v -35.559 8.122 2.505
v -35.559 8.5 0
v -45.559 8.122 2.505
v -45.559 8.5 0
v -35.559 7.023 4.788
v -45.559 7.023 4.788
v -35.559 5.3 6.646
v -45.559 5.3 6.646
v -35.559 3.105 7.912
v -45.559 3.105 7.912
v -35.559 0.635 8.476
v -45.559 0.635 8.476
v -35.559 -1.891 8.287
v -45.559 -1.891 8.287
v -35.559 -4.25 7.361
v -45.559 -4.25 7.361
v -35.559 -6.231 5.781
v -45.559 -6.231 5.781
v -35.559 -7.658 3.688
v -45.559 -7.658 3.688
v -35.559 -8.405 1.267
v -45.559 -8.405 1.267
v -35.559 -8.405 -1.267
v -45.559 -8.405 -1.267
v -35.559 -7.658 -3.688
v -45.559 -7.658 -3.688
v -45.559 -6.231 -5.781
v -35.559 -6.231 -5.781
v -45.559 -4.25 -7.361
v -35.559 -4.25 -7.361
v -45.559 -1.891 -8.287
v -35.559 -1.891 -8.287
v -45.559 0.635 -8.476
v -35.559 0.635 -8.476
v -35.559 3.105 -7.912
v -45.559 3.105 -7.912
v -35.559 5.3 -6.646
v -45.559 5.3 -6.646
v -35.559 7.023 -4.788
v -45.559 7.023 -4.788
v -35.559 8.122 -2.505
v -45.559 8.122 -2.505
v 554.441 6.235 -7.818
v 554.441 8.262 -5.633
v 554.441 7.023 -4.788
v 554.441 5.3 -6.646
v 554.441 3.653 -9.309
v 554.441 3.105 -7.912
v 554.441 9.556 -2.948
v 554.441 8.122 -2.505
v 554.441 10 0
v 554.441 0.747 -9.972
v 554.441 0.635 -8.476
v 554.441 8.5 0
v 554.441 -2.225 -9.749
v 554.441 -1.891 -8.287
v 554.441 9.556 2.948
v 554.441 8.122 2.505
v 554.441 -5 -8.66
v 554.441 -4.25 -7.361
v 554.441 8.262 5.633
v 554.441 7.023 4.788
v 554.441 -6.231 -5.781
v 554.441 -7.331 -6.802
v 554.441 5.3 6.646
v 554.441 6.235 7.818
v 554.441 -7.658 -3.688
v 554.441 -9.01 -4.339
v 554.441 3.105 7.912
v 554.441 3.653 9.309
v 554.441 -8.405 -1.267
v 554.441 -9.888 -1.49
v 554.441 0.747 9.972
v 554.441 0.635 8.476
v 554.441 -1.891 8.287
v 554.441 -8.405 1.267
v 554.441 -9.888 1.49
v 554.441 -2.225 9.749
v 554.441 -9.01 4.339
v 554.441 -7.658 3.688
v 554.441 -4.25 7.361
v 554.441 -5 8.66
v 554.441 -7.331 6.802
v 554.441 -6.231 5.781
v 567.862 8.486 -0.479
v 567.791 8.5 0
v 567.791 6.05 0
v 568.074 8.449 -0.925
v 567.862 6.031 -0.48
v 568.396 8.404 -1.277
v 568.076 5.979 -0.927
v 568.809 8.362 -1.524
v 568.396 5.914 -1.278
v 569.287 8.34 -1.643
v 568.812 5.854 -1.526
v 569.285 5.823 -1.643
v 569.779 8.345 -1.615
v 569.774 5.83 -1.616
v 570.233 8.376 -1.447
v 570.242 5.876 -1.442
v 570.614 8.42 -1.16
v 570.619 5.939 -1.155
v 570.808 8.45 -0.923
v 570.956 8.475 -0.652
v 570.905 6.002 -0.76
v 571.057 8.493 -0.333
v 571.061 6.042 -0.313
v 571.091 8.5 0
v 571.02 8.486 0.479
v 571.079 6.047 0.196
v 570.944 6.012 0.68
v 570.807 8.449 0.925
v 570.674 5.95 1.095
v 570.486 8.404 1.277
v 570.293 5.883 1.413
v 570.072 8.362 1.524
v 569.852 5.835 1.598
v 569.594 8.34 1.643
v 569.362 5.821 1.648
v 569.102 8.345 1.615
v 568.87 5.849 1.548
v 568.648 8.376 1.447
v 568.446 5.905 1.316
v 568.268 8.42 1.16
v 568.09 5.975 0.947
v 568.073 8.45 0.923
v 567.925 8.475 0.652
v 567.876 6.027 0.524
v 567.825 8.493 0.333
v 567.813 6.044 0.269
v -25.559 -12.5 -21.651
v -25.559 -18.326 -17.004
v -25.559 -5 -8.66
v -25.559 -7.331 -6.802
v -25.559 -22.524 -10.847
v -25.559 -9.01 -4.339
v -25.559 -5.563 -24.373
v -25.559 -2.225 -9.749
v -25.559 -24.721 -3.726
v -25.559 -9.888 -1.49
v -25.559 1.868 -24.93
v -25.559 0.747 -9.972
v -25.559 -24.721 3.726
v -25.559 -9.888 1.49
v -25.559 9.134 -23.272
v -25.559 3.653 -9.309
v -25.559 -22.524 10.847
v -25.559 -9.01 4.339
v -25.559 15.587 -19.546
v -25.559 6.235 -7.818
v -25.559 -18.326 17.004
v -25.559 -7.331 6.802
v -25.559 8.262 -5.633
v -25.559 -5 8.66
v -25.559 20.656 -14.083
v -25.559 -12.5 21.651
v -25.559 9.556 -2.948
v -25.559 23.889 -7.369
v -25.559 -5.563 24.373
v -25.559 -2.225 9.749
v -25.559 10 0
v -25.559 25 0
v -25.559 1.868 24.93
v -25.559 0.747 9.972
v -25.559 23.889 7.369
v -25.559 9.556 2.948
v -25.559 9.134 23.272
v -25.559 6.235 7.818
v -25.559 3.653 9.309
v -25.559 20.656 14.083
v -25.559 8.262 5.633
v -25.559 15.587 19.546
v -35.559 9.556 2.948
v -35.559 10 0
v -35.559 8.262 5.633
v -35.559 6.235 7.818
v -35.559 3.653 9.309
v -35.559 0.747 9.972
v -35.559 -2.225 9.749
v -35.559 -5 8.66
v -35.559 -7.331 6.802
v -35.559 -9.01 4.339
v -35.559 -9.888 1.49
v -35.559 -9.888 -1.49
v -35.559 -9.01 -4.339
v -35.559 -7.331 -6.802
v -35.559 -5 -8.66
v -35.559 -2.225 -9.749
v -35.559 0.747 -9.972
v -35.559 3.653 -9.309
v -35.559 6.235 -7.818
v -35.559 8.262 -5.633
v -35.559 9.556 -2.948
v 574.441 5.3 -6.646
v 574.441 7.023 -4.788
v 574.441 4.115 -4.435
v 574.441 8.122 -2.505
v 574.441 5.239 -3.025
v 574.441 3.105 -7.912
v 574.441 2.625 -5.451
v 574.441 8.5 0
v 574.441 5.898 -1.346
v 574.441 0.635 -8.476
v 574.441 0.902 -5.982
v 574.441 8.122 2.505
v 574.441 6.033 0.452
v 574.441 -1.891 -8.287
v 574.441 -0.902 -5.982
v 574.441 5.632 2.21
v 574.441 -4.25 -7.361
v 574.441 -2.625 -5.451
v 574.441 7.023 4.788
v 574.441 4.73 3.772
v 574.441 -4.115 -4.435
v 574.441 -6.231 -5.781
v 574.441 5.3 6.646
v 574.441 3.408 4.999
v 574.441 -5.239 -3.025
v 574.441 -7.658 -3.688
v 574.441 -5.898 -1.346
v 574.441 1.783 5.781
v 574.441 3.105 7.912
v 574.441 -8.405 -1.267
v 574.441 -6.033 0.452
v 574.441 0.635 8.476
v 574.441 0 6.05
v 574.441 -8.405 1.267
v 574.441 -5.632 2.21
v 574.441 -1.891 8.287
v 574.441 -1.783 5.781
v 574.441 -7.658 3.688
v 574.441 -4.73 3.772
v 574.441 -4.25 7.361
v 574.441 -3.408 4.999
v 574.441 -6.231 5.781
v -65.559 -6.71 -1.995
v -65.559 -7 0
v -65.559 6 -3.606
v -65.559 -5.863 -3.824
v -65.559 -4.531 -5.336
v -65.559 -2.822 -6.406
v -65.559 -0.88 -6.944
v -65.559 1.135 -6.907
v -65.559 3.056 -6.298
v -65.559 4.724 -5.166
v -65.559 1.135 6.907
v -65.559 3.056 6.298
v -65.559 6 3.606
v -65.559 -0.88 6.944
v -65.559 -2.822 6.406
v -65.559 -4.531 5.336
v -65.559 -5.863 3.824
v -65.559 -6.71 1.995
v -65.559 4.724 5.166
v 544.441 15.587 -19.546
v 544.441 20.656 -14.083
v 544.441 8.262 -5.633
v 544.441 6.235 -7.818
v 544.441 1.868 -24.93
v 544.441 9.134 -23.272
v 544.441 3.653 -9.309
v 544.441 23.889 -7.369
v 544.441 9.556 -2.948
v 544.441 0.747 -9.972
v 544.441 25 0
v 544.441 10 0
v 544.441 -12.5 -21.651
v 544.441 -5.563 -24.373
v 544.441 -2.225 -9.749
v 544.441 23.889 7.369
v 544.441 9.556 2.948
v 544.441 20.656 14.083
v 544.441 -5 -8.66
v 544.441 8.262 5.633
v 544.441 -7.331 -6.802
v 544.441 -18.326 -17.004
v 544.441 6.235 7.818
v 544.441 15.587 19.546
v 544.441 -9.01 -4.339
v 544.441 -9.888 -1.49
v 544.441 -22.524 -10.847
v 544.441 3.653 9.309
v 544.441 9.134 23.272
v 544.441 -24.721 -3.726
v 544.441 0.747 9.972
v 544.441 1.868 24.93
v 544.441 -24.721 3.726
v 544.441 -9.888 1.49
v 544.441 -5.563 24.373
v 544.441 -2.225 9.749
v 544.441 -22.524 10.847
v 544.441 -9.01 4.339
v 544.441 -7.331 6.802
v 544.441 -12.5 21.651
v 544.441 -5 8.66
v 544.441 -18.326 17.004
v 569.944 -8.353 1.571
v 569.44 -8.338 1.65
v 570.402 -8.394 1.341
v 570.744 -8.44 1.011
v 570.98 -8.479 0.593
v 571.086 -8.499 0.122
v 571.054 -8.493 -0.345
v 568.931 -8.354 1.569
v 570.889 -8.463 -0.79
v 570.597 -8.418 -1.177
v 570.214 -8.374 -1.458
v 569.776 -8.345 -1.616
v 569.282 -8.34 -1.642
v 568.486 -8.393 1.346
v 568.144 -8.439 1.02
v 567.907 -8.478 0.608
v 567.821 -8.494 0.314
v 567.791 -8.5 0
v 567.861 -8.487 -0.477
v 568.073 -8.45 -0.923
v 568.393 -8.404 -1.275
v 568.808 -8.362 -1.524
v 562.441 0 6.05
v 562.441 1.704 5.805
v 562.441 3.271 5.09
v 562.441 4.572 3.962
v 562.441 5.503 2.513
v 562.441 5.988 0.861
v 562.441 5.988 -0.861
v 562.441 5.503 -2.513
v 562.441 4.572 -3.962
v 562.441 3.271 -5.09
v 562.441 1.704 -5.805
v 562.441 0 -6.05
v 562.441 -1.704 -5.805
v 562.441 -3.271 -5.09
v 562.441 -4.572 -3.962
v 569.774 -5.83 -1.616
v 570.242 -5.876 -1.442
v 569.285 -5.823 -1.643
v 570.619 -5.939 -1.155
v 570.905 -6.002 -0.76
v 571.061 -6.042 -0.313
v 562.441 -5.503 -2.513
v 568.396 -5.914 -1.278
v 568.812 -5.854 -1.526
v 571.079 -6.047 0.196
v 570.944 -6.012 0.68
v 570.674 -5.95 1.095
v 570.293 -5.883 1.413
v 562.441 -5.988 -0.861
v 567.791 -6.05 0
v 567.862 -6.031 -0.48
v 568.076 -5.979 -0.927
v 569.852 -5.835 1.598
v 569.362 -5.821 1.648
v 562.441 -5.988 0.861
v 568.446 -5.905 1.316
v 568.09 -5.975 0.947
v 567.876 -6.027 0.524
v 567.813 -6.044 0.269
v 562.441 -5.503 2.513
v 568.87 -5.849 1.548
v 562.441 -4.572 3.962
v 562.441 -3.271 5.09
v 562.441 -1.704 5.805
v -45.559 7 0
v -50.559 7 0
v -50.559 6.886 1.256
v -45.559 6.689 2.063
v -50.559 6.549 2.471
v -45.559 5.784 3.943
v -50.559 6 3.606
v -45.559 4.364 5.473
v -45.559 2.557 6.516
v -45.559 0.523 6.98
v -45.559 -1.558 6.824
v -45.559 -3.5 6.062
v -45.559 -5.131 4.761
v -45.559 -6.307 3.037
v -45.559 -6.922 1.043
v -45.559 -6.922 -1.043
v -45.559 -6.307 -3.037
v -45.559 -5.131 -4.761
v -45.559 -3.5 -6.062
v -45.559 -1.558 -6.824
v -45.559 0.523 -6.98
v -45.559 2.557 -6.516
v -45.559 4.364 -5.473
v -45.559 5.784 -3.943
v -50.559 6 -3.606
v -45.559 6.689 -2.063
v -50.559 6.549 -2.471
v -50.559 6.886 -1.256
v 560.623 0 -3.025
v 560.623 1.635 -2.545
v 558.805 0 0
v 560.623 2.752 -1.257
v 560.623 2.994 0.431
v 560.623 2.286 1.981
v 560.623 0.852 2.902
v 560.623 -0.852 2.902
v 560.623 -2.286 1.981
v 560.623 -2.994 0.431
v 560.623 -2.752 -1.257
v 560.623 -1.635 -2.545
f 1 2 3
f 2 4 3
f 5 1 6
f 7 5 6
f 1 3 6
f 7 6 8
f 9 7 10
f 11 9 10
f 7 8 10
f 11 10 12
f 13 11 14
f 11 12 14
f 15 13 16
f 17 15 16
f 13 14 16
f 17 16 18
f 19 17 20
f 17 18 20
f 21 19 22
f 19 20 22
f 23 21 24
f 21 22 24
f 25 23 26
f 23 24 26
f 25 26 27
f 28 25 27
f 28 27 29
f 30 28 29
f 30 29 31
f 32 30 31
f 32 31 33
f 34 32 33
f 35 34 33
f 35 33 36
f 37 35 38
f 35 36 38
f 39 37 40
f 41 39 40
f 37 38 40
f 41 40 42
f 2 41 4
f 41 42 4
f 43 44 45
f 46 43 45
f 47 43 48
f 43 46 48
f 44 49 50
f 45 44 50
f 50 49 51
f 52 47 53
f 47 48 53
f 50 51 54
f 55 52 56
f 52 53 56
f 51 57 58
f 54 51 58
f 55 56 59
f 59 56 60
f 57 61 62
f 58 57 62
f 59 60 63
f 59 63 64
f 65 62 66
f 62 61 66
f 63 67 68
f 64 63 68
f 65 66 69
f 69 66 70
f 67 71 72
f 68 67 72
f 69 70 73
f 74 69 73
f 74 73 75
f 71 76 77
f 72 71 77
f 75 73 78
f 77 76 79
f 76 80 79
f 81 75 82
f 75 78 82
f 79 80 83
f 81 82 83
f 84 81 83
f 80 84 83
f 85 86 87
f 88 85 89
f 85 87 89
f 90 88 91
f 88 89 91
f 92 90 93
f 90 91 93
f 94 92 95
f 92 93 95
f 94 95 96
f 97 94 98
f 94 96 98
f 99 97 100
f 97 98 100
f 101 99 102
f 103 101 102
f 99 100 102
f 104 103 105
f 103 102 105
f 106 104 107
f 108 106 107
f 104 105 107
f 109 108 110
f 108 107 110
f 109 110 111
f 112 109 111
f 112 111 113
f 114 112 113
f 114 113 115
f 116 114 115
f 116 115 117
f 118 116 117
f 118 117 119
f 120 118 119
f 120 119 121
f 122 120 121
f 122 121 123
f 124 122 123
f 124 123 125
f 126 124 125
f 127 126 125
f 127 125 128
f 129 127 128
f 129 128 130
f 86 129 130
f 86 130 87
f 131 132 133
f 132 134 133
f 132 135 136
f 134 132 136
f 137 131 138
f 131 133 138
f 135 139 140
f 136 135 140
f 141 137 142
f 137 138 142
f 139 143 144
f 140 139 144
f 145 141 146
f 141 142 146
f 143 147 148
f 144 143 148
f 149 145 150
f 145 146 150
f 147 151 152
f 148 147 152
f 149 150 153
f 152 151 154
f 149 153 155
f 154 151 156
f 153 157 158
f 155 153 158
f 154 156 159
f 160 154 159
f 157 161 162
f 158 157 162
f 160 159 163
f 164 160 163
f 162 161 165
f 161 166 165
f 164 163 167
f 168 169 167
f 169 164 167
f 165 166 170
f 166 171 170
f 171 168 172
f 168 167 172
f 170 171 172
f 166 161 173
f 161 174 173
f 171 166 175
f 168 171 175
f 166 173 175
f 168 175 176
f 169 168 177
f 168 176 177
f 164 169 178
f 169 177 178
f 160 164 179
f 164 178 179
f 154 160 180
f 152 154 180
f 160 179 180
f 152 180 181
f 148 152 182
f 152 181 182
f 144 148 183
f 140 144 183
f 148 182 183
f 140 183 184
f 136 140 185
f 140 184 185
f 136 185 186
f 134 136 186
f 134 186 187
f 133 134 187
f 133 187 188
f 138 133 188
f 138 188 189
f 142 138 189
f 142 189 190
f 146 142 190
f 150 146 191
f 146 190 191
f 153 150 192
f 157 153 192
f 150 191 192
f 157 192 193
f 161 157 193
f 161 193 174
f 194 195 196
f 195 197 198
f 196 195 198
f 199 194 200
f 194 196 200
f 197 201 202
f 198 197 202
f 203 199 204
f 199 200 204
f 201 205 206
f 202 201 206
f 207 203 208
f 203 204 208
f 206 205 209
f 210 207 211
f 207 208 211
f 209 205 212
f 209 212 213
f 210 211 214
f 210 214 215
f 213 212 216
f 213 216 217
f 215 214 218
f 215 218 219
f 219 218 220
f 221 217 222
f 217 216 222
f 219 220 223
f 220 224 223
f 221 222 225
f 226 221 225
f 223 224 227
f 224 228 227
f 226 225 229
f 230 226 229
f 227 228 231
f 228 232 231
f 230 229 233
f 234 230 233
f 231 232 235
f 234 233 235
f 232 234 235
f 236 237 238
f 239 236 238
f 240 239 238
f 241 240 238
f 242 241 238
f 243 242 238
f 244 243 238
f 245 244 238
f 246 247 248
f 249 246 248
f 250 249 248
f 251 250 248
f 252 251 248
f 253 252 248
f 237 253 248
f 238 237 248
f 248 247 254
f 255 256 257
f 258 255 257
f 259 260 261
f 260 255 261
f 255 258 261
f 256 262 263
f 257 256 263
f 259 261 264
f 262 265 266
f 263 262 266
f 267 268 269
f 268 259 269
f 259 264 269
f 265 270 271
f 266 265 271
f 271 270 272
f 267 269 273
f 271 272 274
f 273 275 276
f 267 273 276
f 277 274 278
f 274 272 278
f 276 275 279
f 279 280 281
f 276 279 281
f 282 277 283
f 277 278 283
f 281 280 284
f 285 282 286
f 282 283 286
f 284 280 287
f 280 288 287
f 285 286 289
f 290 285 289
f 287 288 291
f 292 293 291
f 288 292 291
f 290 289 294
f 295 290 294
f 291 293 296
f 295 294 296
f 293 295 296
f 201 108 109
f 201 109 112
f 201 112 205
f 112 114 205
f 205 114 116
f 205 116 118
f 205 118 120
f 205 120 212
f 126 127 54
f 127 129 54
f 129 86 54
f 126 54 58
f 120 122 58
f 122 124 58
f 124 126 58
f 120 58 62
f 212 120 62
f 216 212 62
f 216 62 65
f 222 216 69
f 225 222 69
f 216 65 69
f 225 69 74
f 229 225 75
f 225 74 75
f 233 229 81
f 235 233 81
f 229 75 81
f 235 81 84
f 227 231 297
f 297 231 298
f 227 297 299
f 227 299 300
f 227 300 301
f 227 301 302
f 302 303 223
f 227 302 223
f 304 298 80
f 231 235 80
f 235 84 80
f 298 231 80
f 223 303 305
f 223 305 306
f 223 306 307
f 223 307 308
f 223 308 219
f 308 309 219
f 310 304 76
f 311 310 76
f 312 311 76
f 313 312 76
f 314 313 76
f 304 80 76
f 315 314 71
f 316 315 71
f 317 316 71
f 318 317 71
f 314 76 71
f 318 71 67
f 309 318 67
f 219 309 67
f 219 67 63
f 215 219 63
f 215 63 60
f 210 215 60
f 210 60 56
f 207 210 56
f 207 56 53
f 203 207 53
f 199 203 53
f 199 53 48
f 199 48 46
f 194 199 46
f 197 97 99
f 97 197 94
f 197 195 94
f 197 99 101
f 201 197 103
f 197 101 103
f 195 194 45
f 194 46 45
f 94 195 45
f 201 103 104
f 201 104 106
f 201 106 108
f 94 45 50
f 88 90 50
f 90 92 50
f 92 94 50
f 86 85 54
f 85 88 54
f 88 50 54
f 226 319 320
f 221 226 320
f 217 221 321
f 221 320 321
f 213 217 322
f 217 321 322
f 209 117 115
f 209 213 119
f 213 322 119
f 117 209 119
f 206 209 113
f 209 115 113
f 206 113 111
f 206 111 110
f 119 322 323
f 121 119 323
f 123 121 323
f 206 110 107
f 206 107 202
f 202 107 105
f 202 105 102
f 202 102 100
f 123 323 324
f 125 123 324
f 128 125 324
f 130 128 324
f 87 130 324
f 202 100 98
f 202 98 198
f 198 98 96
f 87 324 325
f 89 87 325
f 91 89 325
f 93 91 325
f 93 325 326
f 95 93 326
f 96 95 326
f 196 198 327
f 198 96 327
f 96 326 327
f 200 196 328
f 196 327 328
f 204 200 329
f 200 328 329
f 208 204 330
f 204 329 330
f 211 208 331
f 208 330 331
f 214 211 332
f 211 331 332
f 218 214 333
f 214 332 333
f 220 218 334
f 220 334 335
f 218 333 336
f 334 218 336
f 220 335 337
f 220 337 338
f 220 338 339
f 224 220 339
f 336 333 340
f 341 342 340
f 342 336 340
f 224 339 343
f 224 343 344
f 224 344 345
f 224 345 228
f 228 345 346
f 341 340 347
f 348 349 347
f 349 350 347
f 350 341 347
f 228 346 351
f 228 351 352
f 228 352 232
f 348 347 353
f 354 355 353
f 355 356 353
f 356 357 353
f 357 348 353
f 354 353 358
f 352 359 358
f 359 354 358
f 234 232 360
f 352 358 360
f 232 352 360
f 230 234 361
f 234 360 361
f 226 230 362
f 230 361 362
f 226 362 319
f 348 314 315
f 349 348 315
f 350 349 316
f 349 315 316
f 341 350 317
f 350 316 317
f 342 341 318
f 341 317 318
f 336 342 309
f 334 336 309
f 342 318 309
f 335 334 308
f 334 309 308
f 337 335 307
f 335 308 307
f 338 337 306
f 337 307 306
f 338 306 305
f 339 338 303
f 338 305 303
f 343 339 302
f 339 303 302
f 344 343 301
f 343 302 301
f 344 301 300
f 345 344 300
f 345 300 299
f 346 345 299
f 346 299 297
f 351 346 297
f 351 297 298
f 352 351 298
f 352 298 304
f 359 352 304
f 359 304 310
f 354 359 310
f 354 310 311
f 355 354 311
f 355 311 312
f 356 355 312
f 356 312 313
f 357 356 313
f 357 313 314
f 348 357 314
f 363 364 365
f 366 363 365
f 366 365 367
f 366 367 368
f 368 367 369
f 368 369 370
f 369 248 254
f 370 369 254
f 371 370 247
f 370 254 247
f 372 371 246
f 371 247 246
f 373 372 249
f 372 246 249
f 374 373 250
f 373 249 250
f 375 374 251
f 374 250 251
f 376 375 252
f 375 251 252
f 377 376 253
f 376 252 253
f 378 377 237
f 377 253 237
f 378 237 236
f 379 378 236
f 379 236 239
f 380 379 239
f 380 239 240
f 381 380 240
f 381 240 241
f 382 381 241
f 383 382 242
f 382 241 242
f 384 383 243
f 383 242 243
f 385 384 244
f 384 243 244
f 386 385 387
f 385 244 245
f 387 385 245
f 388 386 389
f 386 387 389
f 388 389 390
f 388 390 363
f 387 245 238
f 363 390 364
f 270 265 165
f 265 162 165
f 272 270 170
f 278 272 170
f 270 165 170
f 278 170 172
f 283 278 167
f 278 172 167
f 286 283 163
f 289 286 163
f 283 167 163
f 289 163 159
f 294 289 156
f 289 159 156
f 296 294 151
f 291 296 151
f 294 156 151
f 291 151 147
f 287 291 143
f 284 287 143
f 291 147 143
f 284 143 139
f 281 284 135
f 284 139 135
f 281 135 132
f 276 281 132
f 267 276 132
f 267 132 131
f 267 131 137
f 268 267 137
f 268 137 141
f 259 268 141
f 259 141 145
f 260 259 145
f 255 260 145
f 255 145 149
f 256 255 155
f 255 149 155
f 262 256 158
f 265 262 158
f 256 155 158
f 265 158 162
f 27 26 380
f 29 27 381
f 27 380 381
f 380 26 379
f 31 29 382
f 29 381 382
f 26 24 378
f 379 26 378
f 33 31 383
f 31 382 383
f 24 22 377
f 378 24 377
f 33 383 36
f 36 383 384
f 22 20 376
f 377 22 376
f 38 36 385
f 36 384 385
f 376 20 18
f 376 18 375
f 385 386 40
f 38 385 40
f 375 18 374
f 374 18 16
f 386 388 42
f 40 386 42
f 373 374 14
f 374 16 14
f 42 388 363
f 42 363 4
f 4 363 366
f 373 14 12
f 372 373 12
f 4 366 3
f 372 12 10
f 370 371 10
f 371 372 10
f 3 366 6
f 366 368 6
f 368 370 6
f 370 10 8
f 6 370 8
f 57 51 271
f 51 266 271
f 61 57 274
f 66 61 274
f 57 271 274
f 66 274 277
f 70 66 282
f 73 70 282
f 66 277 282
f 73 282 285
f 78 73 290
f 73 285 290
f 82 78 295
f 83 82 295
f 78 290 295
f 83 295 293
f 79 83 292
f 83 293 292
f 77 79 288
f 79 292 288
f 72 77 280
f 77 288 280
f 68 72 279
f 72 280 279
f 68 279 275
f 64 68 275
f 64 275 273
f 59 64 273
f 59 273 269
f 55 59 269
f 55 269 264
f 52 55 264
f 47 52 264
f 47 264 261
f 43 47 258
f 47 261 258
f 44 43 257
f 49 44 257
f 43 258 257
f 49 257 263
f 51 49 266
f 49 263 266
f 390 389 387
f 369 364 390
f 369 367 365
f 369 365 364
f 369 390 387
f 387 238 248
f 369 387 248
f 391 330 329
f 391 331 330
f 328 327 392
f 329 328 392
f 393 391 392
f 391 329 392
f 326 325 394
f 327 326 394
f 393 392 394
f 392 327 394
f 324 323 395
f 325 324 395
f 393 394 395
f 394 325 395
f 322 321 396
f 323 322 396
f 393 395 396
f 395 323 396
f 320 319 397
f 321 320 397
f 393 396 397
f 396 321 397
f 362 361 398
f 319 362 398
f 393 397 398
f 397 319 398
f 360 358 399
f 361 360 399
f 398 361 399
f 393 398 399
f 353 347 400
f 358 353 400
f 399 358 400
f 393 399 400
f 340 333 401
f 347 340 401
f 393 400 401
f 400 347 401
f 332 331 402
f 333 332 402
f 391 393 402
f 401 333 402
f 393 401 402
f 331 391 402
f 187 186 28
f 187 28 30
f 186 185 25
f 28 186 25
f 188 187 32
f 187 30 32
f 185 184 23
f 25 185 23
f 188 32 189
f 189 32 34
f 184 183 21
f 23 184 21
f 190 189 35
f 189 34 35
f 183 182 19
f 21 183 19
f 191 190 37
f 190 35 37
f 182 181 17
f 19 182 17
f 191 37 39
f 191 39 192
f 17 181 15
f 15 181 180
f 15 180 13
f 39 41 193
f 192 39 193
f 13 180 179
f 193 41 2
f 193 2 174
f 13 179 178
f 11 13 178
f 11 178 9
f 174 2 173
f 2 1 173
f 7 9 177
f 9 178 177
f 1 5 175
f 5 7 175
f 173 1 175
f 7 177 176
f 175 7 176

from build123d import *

# Parameters (mm, degrees)
CUT_EXTRUDE_2_DEPTH    = 15
MM_CLEARANCE_1_D       = 12.1
MM_CLEARANCE_1_DEPTH   = 12
MM_CLEARANCE_1_TIP     = 3.635206745
HOLE_WIZARD_M4_3_D     = 3.3
HOLE_WIZARD_M4_3_DEPTH = 25
HOLE_WIZARD_M4_3_TIP   = 0.991420021


with BuildPart() as part:
    # 草图2 → 旋转1 (revolve)
    with BuildSketch(Plane.XY):
        Polygon((554.440585902, 10), (544.440585902, 10), (544.440585902, 25), (-25.559414098, 25), (-25.559414098, 10), (-35.559414098, 10), (-35.559414098, 8.5), (-45.559414098, 8.5), (-45.559414098, 7), (-65.559414098, 7), (-65.559414098, 0), (-51.631049649, 0), (574.440585902, 0), (574.440585902, 8.5), (554.440585902, 8.5), align=None)
    revolve(axis=Axis((-62.705882353, 0, 0), (1, 0, 0)))

    # 草图4 → 切除-拉伸2 (cut)
    with BuildSketch(Plane.ZY.offset(65.559414098)):
        with BuildLine():
            Line((-8, 6), (8, 6))
            ThreePointArc((8, 6), (0, 10), (-8, 6))
        make_face()
    extrude(amount=-CUT_EXTRUDE_2_DEPTH, mode=Mode.SUBTRACT)

    # 大小mm Clearance 暗销孔1
    with Locations(Plane(origin=(574.440585902, 0, 0), x_dir=(0, 0, -1), z_dir=(1, 0, 0))):
        with Locations((0, 0)):
            Hole(MM_CLEARANCE_1_D / 2, depth=MM_CLEARANCE_1_DEPTH)
            with Locations((0, 0, -(MM_CLEARANCE_1_DEPTH + MM_CLEARANCE_1_TIP / 2))):  # 118° drill point
                Cone(0, MM_CLEARANCE_1_D / 2, MM_CLEARANCE_1_TIP, mode=Mode.SUBTRACT)

    # M4 螺纹孔3
    with Locations(Plane(origin=(0, 8.5, 0), x_dir=(1, 0, 0), z_dir=(0, 1, 0))):
        with Locations((569.440585902, 0)):
            Hole(HOLE_WIZARD_M4_3_D / 2, depth=HOLE_WIZARD_M4_3_DEPTH)
            with Locations((0, 0, -(HOLE_WIZARD_M4_3_DEPTH + HOLE_WIZARD_M4_3_TIP / 2))):  # 118° drill point
                Cone(0, HOLE_WIZARD_M4_3_D / 2, HOLE_WIZARD_M4_3_TIP, mode=Mode.SUBTRACT)


solid = part.part
